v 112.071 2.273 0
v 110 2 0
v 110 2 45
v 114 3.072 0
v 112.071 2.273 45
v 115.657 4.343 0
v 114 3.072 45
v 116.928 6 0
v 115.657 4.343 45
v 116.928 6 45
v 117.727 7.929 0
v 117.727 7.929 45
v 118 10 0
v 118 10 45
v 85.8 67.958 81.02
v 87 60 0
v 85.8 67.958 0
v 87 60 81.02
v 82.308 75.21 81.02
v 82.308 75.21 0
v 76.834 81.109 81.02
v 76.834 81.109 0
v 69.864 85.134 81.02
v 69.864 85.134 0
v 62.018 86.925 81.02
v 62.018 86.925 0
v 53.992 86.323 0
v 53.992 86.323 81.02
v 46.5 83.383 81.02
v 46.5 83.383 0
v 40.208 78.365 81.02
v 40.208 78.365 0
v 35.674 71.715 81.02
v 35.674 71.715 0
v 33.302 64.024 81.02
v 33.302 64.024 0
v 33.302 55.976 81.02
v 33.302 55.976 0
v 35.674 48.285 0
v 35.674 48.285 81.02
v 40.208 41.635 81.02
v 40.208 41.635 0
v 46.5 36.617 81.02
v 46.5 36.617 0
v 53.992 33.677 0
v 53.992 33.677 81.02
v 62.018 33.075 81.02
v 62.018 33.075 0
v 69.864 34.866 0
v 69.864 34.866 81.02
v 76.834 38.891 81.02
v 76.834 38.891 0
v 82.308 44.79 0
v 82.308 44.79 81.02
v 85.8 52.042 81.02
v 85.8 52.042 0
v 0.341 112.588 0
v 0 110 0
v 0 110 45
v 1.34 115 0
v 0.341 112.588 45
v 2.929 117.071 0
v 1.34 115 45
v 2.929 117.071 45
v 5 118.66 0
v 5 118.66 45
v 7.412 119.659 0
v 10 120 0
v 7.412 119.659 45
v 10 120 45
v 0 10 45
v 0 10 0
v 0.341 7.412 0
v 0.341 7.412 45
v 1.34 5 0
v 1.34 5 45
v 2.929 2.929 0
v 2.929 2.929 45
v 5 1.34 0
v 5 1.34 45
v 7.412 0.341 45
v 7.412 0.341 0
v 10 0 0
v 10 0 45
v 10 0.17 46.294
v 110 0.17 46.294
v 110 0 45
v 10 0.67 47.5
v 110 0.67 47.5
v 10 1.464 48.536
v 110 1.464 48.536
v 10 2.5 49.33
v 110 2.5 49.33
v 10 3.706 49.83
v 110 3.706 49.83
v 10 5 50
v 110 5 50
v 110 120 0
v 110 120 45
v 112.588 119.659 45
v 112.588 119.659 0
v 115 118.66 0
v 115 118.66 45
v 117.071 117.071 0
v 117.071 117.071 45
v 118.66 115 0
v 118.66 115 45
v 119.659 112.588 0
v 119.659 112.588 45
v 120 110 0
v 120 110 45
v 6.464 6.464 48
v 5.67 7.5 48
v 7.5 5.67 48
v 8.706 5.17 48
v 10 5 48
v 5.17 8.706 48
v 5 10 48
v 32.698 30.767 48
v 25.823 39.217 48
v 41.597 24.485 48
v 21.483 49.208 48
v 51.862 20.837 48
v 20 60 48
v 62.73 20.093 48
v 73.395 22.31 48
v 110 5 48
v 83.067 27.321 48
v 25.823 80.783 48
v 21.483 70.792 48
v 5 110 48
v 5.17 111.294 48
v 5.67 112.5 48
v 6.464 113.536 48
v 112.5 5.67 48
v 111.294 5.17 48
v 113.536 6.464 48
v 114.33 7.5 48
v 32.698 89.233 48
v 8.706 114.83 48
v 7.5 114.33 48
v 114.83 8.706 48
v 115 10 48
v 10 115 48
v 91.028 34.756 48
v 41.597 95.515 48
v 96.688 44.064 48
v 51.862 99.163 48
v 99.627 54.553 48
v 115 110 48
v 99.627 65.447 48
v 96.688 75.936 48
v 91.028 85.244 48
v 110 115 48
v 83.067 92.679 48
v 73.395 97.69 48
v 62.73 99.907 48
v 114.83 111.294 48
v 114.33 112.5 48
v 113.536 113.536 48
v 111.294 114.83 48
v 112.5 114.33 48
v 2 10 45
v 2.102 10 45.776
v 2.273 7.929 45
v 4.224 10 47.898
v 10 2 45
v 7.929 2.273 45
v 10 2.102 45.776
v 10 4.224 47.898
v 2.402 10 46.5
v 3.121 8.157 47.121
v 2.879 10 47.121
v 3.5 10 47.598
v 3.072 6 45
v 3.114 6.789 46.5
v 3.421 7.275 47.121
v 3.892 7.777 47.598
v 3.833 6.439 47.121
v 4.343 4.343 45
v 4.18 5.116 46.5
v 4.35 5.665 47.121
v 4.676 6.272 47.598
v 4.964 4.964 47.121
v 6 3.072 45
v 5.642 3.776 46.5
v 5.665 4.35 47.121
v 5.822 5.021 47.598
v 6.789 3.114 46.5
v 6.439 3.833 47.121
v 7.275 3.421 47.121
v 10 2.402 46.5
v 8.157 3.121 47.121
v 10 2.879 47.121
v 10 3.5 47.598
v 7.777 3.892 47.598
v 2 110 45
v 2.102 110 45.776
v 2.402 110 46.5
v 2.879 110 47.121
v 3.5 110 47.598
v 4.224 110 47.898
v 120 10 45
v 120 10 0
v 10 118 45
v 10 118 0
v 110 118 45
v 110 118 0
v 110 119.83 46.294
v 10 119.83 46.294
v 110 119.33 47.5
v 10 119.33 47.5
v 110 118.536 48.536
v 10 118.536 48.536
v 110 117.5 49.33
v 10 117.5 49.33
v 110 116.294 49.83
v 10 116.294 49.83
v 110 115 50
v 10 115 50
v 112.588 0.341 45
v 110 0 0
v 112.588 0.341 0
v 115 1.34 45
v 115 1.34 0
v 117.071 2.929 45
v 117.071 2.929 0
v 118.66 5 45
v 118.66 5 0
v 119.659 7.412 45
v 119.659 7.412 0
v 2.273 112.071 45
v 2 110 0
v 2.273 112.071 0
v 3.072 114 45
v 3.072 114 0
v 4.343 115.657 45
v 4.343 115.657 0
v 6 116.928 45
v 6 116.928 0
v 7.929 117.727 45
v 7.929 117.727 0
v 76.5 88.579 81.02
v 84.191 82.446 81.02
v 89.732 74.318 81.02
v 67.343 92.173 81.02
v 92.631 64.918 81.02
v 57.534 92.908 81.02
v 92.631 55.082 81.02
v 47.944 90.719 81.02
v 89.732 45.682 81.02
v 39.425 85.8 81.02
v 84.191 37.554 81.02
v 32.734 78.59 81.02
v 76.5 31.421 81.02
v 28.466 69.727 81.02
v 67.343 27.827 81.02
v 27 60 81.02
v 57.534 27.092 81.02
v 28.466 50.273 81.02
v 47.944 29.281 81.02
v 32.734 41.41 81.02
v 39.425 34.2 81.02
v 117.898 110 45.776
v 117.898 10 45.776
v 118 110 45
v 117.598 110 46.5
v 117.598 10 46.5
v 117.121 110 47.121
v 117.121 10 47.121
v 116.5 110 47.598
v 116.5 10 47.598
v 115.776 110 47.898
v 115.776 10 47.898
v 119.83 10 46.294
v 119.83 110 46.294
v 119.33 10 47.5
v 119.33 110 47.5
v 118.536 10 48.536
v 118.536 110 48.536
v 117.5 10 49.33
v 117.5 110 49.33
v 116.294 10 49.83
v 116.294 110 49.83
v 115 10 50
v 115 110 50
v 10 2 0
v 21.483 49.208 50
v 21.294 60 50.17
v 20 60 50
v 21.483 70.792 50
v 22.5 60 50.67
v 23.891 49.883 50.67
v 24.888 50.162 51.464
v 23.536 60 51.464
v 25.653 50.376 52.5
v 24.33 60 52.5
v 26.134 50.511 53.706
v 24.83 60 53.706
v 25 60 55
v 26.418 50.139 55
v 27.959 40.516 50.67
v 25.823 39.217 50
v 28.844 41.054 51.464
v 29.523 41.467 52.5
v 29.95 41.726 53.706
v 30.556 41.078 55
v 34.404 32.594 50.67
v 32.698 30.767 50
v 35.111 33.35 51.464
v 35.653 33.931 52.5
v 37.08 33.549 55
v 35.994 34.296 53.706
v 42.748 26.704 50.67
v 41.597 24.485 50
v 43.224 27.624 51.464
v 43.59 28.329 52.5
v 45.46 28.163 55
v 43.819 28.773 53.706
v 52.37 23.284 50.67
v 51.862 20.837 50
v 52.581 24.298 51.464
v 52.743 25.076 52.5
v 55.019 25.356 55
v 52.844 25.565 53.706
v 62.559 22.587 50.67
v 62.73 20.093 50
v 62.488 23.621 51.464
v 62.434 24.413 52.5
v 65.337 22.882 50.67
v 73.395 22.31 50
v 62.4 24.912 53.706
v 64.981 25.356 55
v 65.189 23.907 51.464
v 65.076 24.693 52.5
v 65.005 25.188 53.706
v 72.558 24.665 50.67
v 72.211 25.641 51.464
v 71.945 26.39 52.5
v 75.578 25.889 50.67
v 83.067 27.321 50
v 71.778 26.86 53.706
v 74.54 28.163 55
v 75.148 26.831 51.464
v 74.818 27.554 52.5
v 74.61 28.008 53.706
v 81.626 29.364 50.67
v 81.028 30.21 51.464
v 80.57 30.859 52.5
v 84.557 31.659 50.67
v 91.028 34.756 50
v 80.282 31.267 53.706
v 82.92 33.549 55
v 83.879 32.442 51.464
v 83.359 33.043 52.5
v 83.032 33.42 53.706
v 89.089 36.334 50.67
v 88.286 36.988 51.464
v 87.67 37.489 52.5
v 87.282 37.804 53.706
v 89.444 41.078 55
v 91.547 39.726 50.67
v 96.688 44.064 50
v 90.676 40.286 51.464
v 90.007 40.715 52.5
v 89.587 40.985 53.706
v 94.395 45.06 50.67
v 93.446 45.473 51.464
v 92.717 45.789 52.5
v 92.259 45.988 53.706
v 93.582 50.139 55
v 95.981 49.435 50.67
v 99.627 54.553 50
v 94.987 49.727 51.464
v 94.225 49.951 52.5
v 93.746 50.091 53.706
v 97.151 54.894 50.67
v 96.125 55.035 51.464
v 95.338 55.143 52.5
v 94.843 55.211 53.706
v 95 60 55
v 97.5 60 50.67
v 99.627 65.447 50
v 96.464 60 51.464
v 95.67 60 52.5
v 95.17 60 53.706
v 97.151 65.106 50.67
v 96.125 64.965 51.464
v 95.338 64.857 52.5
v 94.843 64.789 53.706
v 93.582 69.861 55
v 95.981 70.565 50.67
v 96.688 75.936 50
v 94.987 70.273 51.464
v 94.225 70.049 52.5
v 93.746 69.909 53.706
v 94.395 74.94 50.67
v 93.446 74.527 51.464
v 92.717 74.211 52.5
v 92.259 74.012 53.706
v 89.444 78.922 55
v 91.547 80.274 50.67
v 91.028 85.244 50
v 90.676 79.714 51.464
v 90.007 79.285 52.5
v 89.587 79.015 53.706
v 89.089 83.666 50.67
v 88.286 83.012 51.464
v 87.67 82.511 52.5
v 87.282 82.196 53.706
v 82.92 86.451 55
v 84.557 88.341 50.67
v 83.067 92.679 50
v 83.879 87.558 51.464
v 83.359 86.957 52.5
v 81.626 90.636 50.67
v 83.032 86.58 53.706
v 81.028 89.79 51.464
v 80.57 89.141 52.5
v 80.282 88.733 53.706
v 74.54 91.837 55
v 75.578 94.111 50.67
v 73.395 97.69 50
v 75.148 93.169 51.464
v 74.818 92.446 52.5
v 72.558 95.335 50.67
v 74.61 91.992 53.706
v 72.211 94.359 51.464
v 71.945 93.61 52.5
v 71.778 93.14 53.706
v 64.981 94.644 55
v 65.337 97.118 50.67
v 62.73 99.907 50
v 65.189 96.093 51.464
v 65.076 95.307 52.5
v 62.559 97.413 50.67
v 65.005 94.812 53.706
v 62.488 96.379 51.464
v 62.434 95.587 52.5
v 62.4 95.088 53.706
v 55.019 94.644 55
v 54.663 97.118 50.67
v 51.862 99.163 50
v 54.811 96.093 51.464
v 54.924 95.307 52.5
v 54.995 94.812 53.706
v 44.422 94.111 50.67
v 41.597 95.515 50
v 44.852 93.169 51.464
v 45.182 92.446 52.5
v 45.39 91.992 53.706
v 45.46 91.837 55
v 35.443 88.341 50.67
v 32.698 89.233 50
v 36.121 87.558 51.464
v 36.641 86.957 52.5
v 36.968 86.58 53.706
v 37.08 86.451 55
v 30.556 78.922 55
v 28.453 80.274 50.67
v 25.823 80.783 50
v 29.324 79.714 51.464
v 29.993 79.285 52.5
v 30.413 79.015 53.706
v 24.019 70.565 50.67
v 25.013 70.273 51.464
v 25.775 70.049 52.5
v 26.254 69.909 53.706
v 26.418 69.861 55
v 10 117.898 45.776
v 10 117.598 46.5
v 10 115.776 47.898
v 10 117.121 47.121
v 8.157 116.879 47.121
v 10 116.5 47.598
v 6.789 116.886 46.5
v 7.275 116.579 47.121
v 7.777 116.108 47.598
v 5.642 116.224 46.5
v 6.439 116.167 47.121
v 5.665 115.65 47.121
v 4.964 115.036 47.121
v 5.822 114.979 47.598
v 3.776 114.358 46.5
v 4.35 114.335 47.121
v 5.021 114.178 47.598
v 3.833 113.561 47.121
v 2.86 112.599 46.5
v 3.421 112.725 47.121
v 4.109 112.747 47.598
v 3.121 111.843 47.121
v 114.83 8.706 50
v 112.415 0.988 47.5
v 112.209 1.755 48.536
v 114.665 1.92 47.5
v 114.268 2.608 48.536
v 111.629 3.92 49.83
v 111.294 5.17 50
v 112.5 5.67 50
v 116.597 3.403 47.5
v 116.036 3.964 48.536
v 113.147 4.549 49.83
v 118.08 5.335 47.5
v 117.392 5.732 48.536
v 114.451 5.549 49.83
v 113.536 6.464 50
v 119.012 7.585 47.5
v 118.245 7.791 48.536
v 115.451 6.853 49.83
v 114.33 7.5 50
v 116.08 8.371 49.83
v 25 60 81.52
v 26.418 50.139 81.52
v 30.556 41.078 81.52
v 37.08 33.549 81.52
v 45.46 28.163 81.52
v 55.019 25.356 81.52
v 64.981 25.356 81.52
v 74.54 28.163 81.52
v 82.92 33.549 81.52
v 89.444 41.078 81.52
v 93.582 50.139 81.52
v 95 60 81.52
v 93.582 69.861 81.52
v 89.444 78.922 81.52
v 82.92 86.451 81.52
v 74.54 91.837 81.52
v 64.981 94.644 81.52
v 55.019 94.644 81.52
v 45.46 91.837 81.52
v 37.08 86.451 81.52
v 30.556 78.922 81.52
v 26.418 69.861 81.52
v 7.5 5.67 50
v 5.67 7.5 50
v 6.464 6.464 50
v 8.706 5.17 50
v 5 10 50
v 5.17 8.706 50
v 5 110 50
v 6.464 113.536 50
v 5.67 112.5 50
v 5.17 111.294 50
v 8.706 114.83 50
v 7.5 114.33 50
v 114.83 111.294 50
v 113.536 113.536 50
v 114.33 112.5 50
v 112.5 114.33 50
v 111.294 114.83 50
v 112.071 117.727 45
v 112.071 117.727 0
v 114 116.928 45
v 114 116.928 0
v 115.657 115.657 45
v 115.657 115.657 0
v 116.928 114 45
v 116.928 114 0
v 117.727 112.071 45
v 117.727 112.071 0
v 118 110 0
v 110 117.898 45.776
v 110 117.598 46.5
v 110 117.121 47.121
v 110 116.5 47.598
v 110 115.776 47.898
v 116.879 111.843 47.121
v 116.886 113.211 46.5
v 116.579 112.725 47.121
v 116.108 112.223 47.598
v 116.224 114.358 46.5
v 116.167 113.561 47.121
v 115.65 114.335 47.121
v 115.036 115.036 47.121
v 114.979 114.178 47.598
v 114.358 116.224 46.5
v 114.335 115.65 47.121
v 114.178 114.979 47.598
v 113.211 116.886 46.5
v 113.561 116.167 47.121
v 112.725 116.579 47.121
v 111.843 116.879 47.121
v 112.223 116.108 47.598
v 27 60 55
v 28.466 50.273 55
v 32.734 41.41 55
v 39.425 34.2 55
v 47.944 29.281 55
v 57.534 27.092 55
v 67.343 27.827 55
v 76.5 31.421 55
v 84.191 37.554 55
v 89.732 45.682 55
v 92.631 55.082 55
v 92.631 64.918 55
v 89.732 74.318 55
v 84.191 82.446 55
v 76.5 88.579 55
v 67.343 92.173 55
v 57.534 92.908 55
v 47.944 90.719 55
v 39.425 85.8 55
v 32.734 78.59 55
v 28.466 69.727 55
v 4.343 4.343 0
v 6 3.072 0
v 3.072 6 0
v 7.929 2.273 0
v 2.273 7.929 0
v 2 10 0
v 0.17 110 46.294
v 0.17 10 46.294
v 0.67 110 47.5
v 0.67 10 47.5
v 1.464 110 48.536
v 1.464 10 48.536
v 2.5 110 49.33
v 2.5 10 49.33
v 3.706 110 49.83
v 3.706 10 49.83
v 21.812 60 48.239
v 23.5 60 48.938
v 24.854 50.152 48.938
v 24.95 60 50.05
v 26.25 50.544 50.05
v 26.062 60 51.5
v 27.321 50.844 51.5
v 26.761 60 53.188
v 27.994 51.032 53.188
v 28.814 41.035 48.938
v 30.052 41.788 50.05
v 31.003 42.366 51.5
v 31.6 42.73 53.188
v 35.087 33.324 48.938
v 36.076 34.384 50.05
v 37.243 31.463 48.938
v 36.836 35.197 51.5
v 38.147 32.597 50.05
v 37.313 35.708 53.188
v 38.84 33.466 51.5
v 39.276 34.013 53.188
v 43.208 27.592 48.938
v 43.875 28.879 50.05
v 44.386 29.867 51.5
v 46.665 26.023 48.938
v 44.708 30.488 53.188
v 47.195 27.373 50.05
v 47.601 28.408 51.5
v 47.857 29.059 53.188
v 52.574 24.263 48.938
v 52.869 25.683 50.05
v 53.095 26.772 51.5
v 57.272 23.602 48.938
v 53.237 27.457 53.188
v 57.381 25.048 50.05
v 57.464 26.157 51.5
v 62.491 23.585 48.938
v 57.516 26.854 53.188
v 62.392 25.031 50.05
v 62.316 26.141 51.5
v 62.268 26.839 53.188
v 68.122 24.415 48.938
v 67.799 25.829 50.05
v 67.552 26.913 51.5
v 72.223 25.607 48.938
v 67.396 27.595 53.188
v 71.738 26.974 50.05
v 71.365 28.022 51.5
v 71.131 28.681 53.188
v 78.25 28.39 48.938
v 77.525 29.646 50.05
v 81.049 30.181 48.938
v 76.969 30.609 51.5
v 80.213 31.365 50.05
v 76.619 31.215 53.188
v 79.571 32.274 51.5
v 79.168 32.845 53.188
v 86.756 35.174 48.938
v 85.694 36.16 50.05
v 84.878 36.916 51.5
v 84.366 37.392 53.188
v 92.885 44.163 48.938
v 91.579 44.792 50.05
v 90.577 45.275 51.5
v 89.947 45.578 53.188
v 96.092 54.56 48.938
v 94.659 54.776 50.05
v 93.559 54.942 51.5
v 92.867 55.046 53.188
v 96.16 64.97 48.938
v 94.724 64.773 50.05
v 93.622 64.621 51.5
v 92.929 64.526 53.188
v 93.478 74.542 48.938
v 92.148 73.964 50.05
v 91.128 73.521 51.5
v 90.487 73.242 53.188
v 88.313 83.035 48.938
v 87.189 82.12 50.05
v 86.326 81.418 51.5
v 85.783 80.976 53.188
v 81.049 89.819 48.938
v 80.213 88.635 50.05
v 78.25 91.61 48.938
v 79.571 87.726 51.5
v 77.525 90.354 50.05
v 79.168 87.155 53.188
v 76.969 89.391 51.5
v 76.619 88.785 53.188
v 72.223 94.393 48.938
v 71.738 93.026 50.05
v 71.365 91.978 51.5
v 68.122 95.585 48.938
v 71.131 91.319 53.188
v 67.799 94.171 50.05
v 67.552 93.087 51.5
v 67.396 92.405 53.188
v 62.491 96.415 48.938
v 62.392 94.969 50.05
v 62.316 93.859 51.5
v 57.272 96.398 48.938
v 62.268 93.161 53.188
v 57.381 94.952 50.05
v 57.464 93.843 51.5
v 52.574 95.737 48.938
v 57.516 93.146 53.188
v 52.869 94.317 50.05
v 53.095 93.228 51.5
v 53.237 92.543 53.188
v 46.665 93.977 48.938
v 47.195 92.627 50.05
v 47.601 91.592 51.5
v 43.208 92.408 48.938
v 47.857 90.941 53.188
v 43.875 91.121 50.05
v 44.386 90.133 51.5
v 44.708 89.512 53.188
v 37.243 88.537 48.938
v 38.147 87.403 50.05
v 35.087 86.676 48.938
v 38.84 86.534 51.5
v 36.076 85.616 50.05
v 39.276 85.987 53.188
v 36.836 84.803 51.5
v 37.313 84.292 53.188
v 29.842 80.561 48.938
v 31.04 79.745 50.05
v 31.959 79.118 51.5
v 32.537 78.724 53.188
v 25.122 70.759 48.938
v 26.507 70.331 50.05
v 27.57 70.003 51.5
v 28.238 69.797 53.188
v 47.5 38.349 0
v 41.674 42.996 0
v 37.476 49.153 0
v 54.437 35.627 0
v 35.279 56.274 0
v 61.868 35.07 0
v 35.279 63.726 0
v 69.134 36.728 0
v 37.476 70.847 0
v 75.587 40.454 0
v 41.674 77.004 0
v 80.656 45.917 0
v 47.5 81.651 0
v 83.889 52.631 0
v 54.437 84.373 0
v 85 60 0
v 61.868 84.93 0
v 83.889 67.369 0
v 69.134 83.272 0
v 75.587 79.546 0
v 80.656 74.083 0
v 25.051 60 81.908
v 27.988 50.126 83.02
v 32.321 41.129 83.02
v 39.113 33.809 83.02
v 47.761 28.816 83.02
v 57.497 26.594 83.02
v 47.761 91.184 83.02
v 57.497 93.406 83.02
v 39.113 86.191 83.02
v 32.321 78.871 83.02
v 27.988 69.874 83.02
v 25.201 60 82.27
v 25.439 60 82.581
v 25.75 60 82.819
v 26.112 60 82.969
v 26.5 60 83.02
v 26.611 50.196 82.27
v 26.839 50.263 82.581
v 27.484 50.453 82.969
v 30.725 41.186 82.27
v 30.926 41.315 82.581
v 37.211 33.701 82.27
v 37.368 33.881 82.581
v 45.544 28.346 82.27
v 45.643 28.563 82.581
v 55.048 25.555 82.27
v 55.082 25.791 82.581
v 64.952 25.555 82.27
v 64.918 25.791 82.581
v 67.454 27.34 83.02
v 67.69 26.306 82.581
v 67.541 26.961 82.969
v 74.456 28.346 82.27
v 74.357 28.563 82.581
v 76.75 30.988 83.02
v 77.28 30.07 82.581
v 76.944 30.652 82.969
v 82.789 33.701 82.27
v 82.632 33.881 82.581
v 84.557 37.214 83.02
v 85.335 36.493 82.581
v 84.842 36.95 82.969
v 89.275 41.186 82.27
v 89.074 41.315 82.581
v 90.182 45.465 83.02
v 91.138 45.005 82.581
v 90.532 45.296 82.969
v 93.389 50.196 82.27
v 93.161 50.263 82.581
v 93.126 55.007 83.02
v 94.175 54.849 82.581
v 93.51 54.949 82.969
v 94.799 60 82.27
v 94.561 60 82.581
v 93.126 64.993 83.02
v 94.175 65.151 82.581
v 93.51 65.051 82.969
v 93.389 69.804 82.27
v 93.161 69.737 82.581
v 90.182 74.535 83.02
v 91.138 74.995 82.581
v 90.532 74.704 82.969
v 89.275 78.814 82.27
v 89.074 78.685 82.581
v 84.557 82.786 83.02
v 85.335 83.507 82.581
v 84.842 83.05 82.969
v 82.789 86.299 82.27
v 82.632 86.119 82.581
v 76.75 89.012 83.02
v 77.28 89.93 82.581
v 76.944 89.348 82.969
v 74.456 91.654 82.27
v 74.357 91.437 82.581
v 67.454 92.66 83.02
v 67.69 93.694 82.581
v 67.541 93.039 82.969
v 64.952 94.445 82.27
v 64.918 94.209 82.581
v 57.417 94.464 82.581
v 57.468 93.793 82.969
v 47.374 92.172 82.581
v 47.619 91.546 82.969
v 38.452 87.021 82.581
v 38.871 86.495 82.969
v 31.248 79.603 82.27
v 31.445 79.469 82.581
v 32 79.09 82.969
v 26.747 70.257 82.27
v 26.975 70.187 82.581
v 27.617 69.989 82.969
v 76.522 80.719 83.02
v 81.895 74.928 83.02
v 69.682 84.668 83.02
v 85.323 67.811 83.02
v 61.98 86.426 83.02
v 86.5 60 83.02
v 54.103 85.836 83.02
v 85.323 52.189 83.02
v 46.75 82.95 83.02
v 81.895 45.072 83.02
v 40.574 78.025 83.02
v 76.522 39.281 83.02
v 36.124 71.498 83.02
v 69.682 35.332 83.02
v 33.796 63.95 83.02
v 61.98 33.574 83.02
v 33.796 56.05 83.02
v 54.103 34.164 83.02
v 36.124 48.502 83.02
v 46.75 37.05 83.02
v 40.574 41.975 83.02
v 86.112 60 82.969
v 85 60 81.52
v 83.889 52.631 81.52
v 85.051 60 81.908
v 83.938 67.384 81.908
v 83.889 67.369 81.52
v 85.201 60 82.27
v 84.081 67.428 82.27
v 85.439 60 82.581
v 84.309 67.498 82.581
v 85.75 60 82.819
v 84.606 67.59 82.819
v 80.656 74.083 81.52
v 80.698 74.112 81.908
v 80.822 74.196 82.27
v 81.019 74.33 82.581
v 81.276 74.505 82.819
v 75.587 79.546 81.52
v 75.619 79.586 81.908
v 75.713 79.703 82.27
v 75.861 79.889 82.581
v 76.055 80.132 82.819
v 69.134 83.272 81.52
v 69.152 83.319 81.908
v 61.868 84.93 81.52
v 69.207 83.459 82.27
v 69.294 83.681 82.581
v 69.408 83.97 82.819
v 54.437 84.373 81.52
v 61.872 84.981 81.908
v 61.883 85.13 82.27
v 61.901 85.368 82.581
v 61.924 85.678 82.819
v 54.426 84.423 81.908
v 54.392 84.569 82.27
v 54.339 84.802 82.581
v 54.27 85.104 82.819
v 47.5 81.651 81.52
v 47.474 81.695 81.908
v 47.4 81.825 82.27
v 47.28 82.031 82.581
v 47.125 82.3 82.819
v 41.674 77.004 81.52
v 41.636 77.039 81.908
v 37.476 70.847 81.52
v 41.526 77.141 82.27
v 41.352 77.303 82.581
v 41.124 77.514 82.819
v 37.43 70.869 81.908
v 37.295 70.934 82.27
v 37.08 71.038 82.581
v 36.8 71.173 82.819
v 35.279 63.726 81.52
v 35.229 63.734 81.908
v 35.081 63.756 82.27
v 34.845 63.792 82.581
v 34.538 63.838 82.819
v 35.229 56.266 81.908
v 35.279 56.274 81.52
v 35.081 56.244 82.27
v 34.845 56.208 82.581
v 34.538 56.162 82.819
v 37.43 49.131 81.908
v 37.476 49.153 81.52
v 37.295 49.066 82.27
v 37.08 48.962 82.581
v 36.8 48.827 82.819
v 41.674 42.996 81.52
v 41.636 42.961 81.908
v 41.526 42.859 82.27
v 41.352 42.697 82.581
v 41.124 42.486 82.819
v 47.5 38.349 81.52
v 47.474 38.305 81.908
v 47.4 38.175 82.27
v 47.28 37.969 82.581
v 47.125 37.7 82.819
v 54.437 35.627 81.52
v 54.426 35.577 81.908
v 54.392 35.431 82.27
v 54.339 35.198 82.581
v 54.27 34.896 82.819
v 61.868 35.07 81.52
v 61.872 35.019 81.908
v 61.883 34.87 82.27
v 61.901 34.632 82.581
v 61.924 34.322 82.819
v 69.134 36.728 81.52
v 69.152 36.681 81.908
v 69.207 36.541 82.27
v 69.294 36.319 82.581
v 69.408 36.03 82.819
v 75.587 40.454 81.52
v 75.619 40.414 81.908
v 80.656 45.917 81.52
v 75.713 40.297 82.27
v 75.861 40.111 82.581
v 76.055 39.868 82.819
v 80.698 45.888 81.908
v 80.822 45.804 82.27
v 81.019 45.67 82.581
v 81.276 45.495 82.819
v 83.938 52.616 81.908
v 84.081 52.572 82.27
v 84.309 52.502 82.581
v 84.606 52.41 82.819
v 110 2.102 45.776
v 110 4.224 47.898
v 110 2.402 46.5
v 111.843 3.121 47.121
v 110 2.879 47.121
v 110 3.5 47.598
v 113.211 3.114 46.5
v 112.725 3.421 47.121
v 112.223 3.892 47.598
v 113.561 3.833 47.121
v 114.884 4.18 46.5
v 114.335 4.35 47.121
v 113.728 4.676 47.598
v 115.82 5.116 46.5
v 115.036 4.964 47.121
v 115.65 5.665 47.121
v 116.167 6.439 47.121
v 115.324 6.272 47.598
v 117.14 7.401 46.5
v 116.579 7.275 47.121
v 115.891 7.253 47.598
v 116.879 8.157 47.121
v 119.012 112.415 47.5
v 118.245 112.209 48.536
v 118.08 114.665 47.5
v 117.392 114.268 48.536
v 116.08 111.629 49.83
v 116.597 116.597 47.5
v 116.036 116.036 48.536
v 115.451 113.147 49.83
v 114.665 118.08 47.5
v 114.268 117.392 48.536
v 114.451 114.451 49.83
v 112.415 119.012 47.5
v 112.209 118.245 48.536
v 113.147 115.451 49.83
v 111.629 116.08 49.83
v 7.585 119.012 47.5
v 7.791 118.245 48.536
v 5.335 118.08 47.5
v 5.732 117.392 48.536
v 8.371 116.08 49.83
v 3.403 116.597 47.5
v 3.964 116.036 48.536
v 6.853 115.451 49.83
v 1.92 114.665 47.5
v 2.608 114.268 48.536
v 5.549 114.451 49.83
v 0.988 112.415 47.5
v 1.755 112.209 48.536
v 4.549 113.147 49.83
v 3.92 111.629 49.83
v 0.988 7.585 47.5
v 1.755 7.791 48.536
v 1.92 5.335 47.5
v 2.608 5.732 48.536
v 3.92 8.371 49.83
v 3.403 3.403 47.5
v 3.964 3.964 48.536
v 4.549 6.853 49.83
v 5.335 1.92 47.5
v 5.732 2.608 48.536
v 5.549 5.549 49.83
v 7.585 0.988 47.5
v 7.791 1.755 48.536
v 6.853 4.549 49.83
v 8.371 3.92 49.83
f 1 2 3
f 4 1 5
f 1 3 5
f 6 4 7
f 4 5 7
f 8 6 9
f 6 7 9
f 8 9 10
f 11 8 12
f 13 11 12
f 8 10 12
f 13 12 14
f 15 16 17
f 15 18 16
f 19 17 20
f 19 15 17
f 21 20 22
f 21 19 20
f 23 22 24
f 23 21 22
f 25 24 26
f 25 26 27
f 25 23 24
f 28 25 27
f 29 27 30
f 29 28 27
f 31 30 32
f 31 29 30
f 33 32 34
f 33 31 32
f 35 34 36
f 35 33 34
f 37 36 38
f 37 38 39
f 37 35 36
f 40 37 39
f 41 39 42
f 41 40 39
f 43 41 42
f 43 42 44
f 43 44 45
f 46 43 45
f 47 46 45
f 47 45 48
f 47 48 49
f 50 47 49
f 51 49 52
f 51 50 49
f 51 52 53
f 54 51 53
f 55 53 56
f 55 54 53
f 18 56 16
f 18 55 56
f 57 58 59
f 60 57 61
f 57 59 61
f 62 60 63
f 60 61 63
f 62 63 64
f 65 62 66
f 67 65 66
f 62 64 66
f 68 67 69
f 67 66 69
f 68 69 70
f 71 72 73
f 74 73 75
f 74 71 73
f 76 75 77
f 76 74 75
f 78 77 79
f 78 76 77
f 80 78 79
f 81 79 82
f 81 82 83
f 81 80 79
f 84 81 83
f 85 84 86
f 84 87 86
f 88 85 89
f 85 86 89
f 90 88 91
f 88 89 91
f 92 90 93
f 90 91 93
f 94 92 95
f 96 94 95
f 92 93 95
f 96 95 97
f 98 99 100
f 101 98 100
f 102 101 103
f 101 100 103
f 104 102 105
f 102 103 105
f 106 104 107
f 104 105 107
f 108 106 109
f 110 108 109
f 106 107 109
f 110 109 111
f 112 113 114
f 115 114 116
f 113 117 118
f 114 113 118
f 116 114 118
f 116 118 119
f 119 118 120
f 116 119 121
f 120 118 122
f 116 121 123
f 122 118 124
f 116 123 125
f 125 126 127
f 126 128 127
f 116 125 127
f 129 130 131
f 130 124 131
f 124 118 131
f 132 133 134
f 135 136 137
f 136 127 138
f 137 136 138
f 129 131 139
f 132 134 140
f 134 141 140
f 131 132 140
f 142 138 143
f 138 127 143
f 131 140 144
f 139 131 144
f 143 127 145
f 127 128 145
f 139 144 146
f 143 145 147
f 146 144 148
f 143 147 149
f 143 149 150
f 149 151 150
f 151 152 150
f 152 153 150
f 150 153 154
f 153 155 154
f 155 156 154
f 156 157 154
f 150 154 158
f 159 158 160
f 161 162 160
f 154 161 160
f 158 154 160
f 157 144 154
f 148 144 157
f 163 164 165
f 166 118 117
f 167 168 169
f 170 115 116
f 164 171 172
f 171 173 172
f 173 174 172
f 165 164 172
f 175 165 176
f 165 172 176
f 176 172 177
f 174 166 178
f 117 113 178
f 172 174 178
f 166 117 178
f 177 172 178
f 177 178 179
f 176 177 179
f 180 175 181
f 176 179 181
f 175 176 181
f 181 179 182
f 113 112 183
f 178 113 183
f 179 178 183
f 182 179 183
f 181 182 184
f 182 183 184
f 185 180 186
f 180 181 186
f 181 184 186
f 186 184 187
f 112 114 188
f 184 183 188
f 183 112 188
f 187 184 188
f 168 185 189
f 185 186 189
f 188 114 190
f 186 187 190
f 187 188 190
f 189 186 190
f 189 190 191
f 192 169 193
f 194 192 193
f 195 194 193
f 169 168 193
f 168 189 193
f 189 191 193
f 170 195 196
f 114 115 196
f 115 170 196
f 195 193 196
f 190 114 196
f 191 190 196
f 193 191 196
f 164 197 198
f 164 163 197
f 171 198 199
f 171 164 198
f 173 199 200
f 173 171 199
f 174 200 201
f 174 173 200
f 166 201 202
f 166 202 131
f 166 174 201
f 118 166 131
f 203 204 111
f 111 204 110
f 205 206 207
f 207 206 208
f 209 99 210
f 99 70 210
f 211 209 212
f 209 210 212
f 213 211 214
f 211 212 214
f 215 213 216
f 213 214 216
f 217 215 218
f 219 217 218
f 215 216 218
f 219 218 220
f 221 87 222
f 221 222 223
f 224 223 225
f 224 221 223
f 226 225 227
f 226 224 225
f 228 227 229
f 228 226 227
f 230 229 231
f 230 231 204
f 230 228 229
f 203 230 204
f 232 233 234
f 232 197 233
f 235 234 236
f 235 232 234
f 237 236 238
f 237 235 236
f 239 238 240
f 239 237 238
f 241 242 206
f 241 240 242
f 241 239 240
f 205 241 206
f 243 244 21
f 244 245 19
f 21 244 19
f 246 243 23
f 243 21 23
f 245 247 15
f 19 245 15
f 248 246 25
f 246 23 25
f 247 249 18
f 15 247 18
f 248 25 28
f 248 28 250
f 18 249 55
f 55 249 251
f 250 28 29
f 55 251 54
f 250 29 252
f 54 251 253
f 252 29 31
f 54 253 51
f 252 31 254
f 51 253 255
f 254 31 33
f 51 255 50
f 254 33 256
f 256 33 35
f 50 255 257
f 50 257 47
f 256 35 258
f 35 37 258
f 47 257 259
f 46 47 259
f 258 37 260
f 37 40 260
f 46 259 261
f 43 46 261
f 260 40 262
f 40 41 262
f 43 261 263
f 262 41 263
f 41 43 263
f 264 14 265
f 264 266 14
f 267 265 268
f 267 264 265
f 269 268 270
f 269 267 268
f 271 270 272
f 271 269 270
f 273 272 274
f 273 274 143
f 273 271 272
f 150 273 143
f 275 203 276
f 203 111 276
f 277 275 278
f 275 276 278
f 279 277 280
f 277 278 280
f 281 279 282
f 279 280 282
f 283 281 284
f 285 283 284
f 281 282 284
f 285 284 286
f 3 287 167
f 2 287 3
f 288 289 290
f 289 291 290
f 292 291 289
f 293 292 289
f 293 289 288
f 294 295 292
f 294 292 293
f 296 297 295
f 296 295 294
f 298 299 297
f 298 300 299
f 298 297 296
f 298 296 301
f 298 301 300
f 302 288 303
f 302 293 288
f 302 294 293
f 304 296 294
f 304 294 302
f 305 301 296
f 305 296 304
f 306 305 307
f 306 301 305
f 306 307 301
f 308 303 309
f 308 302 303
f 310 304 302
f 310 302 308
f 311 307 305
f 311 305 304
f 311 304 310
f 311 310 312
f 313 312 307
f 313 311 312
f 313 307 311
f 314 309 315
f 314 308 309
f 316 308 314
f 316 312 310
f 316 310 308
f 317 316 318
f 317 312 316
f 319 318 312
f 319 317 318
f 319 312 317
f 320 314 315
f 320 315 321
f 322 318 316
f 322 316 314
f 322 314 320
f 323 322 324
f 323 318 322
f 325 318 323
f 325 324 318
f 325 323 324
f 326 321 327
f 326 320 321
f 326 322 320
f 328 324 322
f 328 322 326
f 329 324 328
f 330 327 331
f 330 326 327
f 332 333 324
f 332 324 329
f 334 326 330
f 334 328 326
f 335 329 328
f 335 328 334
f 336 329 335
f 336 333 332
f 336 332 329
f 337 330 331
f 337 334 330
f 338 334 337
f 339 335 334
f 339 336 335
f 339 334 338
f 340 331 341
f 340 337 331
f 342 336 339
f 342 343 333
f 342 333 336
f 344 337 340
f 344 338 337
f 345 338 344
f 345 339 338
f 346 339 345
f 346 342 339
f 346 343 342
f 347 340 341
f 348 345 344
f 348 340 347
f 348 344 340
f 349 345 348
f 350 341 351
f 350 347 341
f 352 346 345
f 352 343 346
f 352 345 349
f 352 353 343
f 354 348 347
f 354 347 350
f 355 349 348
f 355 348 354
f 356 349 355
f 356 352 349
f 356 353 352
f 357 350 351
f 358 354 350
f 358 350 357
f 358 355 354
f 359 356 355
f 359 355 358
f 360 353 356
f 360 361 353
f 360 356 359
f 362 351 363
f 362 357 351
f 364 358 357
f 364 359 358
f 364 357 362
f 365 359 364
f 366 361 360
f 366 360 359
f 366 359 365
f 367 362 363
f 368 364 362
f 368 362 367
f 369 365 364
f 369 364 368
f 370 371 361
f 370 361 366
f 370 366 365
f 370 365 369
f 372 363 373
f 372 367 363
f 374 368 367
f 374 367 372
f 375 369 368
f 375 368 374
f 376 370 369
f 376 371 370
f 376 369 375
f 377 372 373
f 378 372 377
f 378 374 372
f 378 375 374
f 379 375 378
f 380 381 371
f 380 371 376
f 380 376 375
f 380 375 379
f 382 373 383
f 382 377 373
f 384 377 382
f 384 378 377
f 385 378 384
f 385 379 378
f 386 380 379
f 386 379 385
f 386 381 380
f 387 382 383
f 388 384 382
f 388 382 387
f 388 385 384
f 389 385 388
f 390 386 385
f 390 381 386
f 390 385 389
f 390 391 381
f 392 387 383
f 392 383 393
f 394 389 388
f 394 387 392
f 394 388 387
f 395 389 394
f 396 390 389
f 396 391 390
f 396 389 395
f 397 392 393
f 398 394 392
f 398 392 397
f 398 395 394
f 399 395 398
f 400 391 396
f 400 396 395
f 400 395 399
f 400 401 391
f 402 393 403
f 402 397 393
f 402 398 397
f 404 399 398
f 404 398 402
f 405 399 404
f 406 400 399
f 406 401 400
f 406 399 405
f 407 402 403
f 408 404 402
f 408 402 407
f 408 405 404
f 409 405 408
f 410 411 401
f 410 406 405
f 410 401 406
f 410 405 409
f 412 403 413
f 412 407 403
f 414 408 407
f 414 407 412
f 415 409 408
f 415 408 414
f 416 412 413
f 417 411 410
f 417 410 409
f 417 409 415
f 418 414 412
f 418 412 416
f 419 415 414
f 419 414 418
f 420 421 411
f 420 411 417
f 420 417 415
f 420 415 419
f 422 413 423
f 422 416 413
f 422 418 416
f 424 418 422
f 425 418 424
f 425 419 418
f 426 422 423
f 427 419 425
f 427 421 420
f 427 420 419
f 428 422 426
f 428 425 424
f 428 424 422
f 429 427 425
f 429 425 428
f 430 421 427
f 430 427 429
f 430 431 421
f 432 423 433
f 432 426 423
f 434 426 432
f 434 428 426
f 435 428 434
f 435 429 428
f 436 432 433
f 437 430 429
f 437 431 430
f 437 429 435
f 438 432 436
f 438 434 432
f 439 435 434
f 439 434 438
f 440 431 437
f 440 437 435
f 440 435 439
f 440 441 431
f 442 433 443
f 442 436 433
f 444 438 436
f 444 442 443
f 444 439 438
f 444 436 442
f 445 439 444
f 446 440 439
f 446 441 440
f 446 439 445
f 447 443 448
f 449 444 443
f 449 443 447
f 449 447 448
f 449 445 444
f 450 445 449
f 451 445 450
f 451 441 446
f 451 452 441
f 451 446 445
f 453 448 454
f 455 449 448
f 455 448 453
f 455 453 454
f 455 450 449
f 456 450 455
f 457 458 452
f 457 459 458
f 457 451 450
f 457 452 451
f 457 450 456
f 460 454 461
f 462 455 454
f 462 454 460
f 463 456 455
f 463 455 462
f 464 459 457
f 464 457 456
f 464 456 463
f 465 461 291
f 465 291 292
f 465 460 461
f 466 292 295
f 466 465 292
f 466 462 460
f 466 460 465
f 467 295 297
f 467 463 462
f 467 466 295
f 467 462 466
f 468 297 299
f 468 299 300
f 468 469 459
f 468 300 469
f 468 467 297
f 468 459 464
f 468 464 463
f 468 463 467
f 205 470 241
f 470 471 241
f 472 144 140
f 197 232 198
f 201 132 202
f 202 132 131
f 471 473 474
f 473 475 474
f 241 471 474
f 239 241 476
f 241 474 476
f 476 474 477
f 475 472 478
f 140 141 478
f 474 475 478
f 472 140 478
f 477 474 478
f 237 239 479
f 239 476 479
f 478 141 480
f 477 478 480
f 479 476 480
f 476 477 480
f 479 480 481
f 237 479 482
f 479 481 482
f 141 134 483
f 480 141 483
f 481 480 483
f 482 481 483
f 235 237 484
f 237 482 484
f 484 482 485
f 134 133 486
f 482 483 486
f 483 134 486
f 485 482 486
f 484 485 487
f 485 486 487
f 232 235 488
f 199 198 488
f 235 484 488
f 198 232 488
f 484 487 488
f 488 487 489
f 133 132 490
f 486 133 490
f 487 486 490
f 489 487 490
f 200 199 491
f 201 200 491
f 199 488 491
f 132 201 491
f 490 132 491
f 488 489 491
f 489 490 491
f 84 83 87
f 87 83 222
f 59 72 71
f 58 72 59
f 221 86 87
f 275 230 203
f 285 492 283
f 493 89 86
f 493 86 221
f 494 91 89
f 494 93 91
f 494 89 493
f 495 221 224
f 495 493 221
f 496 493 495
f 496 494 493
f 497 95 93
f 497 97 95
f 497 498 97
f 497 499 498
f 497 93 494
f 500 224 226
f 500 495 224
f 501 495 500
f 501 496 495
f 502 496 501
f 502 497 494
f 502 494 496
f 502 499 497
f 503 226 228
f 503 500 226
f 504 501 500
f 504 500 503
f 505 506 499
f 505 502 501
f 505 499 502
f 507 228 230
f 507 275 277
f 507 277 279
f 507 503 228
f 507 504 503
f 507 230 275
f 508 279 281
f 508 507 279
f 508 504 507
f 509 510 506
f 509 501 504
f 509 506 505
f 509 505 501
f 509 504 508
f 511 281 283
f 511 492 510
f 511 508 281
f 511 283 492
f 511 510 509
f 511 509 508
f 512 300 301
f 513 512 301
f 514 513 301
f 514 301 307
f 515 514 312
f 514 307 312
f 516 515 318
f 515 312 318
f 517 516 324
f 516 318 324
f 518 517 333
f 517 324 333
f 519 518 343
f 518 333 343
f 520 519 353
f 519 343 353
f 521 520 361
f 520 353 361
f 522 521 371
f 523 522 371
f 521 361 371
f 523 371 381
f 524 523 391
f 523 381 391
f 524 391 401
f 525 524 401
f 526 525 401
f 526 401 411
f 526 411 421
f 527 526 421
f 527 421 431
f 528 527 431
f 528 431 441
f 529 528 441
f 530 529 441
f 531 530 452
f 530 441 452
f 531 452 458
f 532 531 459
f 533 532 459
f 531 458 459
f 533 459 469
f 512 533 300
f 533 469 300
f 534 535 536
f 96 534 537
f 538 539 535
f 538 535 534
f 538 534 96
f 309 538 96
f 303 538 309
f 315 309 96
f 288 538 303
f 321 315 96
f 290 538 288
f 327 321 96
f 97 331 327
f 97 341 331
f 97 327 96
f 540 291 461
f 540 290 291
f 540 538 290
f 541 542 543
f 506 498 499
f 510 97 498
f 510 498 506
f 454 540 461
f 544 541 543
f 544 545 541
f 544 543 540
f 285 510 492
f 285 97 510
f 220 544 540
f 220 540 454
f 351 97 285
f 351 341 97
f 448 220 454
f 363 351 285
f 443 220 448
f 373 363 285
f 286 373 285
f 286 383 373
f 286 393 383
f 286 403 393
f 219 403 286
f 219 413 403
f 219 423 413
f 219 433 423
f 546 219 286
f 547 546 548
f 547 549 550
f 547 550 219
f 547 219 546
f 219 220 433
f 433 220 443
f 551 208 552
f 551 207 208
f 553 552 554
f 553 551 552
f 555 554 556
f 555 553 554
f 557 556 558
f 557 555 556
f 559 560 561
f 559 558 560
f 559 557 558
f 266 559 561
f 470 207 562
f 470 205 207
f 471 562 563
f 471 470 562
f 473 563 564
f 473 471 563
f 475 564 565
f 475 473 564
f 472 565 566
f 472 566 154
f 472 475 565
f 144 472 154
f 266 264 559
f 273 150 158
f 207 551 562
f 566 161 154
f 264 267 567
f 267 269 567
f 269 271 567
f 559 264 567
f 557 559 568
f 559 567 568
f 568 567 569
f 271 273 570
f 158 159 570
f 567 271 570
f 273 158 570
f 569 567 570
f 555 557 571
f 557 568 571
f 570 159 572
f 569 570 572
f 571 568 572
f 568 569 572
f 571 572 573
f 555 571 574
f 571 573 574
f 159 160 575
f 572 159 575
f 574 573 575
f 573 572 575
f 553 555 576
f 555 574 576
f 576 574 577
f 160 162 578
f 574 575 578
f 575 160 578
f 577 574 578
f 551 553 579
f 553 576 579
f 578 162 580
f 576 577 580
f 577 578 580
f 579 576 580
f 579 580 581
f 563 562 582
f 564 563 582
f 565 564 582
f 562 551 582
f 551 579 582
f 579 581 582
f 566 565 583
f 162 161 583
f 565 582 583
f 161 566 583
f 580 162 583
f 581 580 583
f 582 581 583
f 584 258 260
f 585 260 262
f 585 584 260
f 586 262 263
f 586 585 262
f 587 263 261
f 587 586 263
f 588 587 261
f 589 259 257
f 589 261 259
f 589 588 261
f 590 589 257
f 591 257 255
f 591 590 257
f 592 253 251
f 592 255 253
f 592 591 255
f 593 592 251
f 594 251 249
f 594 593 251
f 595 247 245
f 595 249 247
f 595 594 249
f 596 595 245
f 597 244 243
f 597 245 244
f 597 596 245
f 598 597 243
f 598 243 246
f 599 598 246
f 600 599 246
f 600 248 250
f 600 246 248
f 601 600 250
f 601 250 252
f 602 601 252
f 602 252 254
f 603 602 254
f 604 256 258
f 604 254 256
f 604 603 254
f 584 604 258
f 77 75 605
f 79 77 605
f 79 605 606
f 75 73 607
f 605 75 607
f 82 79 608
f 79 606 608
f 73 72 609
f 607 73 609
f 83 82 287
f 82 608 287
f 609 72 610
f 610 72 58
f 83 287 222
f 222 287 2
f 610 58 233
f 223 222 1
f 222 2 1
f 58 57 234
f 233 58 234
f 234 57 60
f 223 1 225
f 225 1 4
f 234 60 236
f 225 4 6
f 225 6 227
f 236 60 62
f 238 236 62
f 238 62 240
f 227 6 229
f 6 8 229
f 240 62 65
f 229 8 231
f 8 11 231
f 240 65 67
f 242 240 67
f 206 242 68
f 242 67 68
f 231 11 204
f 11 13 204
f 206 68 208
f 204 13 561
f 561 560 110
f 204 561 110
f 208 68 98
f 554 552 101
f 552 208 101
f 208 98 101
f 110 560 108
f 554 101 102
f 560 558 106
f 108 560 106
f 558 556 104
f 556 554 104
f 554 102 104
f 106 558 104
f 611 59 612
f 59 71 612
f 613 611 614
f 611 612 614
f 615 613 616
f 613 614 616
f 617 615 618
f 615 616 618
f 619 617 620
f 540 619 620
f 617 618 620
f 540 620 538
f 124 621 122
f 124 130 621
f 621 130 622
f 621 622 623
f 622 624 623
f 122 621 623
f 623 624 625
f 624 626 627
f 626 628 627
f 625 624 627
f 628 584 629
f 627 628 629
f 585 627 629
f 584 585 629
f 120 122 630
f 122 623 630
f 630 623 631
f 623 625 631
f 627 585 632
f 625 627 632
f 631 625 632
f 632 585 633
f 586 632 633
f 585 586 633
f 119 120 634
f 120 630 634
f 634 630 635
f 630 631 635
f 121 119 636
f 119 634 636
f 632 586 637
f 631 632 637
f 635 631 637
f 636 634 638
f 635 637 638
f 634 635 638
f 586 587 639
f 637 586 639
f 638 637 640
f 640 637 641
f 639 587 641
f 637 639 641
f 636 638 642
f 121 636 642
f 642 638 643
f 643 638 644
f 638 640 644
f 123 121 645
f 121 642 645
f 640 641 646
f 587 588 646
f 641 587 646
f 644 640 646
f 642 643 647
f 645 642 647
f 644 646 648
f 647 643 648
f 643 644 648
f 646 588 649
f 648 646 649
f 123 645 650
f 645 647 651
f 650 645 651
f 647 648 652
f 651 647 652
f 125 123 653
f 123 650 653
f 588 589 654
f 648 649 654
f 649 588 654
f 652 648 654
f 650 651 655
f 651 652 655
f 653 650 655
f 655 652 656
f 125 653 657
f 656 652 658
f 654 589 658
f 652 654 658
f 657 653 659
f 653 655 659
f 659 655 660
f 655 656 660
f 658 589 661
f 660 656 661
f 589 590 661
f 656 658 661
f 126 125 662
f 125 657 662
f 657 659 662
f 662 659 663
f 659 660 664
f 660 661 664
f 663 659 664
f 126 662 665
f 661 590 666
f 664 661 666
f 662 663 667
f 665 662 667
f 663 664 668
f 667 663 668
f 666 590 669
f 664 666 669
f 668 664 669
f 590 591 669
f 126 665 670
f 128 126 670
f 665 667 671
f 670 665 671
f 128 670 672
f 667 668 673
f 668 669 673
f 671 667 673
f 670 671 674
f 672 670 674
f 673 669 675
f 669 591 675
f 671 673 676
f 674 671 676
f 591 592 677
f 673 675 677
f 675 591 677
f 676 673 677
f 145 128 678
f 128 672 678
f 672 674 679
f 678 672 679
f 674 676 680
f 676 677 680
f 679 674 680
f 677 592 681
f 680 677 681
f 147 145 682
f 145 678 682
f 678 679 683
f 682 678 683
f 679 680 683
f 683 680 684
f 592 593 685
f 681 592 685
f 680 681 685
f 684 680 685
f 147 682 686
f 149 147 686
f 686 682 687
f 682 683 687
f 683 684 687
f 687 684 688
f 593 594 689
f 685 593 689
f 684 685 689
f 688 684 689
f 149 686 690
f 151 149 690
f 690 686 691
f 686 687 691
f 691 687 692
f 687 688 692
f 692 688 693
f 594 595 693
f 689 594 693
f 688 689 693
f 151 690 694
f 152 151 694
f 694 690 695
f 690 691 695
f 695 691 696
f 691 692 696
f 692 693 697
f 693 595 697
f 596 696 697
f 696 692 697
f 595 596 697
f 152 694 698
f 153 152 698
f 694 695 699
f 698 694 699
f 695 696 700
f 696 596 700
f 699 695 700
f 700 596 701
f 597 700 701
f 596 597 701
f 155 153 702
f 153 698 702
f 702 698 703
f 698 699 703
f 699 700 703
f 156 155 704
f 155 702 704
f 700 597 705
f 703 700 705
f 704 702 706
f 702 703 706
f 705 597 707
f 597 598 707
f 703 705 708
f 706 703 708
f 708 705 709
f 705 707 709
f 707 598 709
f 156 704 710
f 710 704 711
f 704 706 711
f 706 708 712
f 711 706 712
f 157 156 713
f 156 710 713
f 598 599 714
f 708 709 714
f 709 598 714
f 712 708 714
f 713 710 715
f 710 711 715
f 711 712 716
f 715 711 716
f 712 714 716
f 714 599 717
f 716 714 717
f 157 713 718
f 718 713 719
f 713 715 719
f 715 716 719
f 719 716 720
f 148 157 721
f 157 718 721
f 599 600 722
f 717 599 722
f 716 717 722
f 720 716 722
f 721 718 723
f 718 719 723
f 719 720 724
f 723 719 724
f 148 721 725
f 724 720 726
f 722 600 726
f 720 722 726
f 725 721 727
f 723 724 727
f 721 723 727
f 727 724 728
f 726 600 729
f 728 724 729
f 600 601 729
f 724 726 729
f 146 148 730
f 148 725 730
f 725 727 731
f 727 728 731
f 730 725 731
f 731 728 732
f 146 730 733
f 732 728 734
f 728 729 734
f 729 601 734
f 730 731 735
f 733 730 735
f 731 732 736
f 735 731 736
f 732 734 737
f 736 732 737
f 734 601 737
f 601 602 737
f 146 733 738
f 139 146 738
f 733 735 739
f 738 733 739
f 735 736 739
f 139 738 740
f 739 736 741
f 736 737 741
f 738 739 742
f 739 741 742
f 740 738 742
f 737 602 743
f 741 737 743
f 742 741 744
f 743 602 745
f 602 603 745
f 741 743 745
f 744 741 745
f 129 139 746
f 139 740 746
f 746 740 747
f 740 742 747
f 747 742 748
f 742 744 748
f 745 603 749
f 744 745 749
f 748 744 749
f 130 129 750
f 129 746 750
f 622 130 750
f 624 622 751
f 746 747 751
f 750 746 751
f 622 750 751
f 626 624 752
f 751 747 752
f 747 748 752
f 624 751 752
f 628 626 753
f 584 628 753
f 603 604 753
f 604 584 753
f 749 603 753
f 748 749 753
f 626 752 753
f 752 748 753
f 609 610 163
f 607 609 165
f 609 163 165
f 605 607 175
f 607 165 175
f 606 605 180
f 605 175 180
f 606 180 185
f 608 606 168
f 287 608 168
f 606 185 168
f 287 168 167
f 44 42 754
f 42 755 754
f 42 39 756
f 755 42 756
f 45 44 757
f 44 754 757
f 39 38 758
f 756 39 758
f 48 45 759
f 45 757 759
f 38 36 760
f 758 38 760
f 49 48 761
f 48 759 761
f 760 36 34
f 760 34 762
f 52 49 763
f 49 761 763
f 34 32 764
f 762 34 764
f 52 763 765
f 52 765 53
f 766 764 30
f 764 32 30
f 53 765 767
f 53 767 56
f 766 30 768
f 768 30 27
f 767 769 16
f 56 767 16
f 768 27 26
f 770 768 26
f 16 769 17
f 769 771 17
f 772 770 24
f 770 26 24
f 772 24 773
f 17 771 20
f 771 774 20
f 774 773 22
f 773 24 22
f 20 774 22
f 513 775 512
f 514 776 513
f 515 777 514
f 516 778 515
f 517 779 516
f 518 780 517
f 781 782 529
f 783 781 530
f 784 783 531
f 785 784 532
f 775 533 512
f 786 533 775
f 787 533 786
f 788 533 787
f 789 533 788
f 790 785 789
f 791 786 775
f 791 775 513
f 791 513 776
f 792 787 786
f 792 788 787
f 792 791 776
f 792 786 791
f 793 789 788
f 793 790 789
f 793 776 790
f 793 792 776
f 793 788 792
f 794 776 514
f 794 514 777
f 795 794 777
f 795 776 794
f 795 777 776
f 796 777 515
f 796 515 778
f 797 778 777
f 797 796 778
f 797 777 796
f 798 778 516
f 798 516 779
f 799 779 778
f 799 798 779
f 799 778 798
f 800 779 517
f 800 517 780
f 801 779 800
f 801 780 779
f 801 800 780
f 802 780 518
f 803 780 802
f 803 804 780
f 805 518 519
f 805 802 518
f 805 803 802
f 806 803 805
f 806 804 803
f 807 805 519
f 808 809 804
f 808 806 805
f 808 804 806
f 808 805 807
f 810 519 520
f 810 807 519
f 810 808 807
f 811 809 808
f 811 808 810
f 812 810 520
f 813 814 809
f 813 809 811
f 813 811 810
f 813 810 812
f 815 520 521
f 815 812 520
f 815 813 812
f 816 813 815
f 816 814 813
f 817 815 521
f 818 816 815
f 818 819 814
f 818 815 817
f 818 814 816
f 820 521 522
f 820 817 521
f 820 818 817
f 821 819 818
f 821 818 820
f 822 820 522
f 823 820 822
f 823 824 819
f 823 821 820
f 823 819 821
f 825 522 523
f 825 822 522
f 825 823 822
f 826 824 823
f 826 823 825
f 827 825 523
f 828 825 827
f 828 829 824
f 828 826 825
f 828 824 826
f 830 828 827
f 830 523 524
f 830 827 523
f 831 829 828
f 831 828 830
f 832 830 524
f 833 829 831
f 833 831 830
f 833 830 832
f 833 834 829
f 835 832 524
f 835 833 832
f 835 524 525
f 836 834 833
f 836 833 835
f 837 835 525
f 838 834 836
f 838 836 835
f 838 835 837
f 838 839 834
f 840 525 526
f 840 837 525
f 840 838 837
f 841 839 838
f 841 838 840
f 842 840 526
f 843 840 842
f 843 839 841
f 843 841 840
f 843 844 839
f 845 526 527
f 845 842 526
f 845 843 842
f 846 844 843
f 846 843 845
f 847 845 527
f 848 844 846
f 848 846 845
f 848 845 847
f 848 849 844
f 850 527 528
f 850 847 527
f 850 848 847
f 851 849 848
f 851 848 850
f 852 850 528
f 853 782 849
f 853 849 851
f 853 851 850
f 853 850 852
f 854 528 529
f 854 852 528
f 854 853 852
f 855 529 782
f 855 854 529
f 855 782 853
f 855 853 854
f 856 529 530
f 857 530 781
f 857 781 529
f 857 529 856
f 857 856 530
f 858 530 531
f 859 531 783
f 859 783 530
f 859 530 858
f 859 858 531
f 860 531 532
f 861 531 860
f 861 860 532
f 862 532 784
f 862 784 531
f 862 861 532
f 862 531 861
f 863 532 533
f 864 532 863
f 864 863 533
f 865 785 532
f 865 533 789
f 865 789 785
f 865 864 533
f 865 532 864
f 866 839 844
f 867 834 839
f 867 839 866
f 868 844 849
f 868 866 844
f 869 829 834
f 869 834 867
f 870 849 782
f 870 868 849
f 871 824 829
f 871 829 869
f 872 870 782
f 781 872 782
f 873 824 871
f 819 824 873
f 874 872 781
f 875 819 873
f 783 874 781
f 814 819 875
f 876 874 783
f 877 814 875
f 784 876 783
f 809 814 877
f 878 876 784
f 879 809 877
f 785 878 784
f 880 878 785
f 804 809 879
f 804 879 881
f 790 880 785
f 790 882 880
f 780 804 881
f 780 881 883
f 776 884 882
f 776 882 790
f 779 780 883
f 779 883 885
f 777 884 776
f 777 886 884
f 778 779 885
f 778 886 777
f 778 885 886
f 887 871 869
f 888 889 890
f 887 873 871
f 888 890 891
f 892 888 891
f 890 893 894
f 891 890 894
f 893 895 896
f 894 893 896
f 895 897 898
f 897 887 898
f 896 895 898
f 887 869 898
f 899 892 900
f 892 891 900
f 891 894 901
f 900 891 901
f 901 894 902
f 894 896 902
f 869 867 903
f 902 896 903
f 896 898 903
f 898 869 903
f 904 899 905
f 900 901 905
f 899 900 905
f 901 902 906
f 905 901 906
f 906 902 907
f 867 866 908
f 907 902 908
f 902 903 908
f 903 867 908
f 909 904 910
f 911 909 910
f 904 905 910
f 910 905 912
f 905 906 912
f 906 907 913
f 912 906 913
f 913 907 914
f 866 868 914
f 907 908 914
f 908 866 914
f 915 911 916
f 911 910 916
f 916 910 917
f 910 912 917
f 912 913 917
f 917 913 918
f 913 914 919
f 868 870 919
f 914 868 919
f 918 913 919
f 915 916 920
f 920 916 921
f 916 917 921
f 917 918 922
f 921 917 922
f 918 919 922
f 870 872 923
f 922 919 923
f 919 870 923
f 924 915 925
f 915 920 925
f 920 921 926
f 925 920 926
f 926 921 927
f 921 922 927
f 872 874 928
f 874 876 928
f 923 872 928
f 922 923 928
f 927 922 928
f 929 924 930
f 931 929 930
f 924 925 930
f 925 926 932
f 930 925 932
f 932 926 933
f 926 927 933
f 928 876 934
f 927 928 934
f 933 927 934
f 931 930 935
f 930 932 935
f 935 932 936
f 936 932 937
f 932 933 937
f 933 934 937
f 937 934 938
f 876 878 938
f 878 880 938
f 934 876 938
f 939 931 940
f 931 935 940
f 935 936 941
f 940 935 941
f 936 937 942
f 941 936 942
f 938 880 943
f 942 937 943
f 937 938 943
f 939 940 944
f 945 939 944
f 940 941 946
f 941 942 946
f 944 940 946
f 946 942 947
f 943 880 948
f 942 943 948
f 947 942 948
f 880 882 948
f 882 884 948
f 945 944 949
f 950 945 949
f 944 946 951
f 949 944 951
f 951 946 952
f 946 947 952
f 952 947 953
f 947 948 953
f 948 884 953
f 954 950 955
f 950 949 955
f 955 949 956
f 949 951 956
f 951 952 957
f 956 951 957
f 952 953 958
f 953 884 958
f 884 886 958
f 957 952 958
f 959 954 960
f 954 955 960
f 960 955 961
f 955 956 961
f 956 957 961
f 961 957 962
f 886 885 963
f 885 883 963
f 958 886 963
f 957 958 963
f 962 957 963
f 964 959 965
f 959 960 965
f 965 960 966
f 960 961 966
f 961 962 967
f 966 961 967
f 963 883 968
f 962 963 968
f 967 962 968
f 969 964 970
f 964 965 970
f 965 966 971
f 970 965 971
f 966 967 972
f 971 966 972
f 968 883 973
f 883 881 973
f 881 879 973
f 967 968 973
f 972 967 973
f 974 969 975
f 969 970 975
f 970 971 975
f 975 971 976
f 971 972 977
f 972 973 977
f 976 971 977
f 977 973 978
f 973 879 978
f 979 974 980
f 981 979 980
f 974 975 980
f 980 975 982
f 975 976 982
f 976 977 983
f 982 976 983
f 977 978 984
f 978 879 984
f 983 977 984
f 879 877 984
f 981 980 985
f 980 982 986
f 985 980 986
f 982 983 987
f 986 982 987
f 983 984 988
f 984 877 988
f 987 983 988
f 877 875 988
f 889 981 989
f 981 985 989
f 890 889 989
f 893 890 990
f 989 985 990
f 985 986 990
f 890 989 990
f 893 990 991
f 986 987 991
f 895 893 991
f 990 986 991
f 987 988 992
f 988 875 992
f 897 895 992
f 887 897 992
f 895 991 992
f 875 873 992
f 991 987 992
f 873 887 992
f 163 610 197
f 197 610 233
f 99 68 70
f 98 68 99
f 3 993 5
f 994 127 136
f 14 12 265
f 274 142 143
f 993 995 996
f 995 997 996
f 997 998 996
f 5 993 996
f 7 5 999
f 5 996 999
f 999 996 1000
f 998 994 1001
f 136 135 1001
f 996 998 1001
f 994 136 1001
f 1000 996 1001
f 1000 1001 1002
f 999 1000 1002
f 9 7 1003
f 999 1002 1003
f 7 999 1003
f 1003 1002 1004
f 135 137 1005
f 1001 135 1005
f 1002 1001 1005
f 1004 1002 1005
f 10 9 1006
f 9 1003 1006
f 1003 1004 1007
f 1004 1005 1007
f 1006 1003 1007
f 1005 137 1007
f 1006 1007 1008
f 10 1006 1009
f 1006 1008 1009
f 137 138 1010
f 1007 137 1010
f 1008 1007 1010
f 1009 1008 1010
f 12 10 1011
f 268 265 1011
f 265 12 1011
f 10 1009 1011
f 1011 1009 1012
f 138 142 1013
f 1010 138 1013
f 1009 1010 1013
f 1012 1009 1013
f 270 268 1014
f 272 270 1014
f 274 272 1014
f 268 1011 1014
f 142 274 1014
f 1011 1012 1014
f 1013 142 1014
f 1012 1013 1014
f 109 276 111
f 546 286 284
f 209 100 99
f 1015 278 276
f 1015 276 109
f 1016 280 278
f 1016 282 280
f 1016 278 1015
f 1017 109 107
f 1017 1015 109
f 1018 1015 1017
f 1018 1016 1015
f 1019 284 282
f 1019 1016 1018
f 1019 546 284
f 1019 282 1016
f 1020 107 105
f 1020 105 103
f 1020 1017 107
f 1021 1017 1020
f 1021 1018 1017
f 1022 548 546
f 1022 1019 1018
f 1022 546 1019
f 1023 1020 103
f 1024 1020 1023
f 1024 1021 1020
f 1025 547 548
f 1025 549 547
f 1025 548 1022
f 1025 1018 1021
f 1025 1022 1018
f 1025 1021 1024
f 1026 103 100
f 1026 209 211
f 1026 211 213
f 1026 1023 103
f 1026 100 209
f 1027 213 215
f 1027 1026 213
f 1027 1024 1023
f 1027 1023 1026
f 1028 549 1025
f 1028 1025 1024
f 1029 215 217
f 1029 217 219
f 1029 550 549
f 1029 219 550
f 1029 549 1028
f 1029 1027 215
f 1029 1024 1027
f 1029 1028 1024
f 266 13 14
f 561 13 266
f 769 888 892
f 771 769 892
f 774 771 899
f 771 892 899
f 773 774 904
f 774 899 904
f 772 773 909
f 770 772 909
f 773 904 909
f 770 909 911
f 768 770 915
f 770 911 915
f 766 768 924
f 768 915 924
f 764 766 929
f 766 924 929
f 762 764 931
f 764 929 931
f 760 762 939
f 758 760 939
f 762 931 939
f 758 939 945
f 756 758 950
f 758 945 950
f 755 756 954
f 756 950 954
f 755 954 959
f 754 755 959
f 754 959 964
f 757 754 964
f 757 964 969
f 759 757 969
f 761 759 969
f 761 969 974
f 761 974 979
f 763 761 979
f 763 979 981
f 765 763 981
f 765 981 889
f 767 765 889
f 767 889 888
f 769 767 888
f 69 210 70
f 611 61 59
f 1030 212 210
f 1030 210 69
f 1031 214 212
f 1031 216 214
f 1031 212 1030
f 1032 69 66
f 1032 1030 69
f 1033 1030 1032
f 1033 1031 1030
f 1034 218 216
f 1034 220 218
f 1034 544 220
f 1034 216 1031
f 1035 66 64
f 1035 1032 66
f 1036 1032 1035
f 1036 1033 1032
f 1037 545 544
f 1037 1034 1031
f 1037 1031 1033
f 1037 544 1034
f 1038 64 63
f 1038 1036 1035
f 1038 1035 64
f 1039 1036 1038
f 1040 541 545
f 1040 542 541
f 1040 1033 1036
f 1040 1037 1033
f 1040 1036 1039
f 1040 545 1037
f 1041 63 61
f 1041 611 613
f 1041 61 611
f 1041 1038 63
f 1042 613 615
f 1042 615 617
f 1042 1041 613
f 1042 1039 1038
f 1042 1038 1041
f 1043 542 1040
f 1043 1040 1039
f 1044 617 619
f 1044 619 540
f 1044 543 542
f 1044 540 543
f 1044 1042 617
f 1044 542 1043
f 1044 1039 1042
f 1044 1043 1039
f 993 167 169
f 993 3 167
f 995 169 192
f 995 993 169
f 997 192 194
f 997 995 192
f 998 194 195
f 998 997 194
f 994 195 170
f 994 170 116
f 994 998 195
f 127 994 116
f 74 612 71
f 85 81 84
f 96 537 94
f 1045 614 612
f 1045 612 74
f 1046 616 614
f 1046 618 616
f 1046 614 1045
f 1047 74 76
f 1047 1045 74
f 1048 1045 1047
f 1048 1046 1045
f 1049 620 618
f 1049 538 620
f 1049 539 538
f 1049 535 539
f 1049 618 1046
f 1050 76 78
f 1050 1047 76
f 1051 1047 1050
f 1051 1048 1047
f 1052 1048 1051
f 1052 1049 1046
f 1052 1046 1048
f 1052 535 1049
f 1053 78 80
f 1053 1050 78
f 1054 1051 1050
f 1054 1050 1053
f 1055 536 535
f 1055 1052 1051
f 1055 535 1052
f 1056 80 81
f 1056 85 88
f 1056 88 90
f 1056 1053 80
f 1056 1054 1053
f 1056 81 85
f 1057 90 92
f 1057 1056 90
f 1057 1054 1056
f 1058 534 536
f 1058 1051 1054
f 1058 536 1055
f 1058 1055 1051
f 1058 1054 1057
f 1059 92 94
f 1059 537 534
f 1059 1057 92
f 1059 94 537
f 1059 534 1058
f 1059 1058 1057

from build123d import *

# Parameters (mm, degrees)
SKETCH1_W           = 120
SKETCH1_H           = 120
BOSS_EXTRUDE1_DEPTH = 50
SKETCH2_R           = 35
BOSS_EXTRUDE2_DEPTH = 33.02
SKETCH3_R           = 25
CUT_EXTRUDE1_DEPTH  = 189.924112807
FILLET1_R           = 10
FILLET2_R           = 1.5
FILLET3_R           = 5
SHELL1_T            = -2


with BuildPart() as part:
    # Sketch1 → Boss-Extrude1 (new body)
    with BuildSketch(Plane.XY):
        with Locations((60, 60)):
            Rectangle(SKETCH1_W, SKETCH1_H)
    extrude(amount=BOSS_EXTRUDE1_DEPTH)

    # Sketch2 → Boss-Extrude2 (add)
    with BuildSketch(Plane.XY.offset(50)):
        with Locations(Location((60, 60, 0), (0, 0, 180))):
            Circle(SKETCH2_R)
    extrude(amount=BOSS_EXTRUDE2_DEPTH)

    # Sketch3 → Cut-Extrude1 (cut, through all)
    with BuildSketch(Plane.XY.offset(83.02)):
        with Locations((60, 60)):
            Circle(SKETCH3_R)
    extrude(amount=-CUT_EXTRUDE1_DEPTH, mode=Mode.SUBTRACT)

    # Fillet1
    fillet1_edges = [part.edges().sort_by_distance(p)[0] for p in [
        (0, 120, 25),
        (120, 120, 25),
        (120, 0, 25),
        (0, 0, 25),
    ]]
    fillet(fillet1_edges, radius=FILLET1_R)

    # Fillet2
    fillet2_edges = [part.edges().sort_by_distance(p)[0] for p in [
        (95, 60, 83.02),
        (35, 60, 83.02),
    ]]
    fillet(fillet2_edges, radius=FILLET2_R)

    # Fillet3
    fillet3_edges = [part.edges().sort_by_distance(p)[0] for p in [
        (95, 60, 50),
        (60, 0, 50),
        (0, 60, 50),
        (120, 60, 50),
        (60, 120, 50),
        (117.071067812, 2.928932188, 50),
        (117.071067812, 117.071067812, 50),
        (2.928932188, 117.071067812, 50),
        (2.928932188, 2.928932188, 50),
    ]]
    fillet(fillet3_edges, radius=FILLET3_R)

    # Shell1
    shell1_openings = [part.faces().sort_by_distance(p)[0] for p in [
        (60, 1.697056275, 0),
    ]]
    offset(amount=SHELL1_T, openings=shell1_openings, kind=Kind.INTERSECTION)


solid = part.part
